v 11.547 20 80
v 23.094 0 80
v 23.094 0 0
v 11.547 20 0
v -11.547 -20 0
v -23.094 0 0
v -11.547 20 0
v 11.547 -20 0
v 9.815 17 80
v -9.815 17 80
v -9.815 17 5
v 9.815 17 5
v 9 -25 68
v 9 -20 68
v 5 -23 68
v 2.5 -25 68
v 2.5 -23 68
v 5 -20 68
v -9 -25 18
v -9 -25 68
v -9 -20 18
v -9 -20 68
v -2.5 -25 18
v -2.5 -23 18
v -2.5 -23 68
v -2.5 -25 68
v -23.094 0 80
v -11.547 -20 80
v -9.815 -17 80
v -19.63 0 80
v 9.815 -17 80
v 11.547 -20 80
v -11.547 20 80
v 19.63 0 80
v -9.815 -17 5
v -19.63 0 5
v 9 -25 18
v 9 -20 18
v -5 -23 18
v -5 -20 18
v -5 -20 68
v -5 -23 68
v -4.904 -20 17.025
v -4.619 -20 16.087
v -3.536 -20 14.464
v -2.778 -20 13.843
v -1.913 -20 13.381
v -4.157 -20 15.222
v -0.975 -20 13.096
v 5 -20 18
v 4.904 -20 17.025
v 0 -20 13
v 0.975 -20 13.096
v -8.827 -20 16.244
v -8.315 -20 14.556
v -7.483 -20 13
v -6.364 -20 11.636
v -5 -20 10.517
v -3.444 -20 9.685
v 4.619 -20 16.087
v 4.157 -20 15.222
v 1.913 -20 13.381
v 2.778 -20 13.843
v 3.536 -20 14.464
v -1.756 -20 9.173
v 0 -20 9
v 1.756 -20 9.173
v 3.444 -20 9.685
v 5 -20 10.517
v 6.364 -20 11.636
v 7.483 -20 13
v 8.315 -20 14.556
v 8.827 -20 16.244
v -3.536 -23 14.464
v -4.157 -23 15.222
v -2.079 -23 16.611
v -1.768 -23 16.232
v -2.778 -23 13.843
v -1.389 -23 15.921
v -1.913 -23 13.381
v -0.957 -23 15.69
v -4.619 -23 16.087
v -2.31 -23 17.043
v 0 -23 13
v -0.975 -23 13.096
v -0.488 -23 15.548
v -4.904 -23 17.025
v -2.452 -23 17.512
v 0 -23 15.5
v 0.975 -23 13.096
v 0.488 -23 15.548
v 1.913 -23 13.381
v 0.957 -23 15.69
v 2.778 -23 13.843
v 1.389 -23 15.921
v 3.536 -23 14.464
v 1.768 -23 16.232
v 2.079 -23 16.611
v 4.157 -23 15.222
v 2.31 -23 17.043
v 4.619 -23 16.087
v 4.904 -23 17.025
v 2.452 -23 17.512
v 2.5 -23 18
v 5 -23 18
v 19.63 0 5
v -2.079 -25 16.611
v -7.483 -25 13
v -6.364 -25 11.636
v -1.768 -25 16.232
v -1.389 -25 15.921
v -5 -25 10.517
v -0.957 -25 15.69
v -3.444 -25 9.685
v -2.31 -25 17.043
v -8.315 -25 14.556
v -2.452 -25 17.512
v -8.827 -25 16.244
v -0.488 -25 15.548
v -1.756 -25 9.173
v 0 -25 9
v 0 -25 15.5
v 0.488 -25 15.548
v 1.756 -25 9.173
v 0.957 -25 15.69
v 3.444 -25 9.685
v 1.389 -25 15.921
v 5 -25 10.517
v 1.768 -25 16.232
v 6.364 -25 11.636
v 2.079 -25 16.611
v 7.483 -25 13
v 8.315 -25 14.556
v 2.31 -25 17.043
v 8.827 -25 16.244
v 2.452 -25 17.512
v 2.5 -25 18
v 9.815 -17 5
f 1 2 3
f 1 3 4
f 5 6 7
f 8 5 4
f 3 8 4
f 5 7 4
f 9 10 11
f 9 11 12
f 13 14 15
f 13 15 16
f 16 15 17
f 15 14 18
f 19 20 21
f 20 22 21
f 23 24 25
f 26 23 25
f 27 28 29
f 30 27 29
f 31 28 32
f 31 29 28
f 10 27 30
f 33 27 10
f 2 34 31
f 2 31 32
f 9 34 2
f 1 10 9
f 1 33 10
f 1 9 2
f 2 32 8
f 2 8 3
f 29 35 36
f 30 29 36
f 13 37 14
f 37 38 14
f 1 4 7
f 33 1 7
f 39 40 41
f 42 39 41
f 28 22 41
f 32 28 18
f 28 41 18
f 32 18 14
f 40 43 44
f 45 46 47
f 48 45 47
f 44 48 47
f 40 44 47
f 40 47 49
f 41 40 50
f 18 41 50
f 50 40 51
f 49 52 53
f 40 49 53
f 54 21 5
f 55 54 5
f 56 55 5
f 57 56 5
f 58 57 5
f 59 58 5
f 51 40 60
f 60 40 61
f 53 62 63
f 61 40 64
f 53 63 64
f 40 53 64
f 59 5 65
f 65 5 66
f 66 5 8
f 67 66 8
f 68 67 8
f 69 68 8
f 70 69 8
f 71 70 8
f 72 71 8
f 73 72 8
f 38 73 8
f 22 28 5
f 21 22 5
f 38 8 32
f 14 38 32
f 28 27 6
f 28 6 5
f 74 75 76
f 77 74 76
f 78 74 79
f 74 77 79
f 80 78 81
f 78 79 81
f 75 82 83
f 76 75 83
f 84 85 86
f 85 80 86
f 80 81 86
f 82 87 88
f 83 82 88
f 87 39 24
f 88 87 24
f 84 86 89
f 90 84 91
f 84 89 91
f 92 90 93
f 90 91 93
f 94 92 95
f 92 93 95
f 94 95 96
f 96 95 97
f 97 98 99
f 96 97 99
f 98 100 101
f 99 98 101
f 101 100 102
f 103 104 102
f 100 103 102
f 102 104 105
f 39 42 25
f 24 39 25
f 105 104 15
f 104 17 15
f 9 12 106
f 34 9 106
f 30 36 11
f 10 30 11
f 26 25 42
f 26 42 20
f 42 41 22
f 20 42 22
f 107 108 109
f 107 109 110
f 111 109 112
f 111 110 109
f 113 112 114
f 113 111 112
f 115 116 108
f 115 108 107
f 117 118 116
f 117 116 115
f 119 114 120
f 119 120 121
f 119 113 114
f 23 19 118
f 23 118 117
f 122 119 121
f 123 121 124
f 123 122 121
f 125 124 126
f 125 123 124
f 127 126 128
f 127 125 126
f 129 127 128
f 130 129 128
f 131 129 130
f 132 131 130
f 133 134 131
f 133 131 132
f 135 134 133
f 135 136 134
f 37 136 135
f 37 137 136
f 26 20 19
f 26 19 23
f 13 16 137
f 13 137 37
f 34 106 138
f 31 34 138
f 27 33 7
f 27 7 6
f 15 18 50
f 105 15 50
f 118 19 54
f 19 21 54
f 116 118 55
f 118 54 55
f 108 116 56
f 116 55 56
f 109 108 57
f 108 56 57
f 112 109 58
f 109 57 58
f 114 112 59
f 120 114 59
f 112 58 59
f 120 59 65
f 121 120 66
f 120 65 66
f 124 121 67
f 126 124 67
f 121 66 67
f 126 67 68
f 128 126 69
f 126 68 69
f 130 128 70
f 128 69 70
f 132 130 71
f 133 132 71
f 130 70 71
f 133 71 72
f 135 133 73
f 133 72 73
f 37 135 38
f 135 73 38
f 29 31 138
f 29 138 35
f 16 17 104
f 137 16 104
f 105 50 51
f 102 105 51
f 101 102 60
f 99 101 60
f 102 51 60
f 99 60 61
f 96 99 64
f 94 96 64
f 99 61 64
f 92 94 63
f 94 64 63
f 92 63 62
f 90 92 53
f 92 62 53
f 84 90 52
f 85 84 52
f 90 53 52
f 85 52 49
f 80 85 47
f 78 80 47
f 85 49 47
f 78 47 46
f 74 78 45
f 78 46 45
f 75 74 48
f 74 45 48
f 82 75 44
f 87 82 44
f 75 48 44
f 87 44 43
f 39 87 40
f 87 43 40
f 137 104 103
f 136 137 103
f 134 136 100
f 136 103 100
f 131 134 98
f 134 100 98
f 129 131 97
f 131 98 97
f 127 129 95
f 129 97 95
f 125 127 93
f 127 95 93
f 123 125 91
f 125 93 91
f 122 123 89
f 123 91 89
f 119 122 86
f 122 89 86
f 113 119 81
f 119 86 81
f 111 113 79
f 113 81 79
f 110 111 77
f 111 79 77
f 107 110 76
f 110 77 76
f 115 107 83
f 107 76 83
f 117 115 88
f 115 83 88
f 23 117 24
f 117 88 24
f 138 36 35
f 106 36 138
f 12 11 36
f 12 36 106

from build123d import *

# Parameters (mm, degrees)
F1_DEPTH = 80
F3_DEPTH = 5
F5_DEPTH = 3
F7_DEPTH = 2


with BuildPart() as f1:
    # F0 (on Top) → F1 (new body)
    with BuildSketch(Plane.XY):
        Polygon((11.547005, 20), (-11.547005, 20), (-23.094011, 0), (-11.547005, -20), (11.547005, -20), (23.094011, 0), align=None)
        Polygon((-9.814955, -17), (-19.629909, 0), (-9.814955, 17), (9.814955, 17), (19.629909, 0), (9.814955, -17), align=None, mode=Mode.SUBTRACT)
    extrude(amount=F1_DEPTH)

    # F2 (on Top) → F3 (join)
    with BuildSketch(Plane.XY):
        Polygon((11.547005, 20), (-11.547005, 20), (-23.094011, 0), (-11.547005, -20), (11.547005, -20), (23.094011, 0), align=None)
    extrude(amount=F3_DEPTH)

    # F4 (on face) → F5 (join)
    with BuildSketch(Plane.XZ.offset(20)):
        with BuildLine():
            Line((-5, 18), (-5, 68))
            Line((-5, 68), (-9, 68))
            Line((-9, 68), (-9, 18))
            ThreePointArc((-9, 18), (0, 9), (9, 18))
            Line((9, 18), (9, 68))
            Line((9, 68), (5, 68))
            Line((5, 68), (5, 18))
            ThreePointArc((5, 18), (0, 13), (-5, 18))
        make_face()
    extrude(amount=F5_DEPTH)

    # F6 (on face) → F7 (join)
    with BuildSketch(Plane.XZ.offset(23)):
        with BuildLine():
            Line((-2.5, 68), (-9, 68))
            Line((-9, 68), (-9, 18))
            ThreePointArc((-9, 18), (0, 9), (9, 18))
            Line((9, 18), (9, 68))
            Line((9, 68), (2.5, 68))
            Line((2.5, 68), (2.5, 18))
            ThreePointArc((2.5, 18), (0, 15.5), (-2.5, 18))
            Line((-2.5, 18), (-2.5, 68))
        make_face()
    extrude(amount=F7_DEPTH)


solid = f1.part
